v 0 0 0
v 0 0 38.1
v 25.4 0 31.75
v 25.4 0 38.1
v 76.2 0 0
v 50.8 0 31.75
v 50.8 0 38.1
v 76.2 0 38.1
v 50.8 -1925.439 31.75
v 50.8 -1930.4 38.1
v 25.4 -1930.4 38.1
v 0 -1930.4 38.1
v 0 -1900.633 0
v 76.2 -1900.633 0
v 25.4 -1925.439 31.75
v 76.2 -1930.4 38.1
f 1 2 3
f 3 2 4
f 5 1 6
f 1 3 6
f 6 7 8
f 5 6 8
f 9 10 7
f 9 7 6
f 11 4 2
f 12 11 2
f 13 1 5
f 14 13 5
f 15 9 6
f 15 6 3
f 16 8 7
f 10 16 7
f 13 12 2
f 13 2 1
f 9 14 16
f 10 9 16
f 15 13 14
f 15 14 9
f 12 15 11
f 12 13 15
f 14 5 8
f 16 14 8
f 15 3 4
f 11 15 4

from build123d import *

# Parameters (mm, degrees)
F1_DEPTH    = 1930.4
F2_T1_DEPTH = 272.7606343602


# Not quite as in the source:
# - a fillet or chamfer that OpenCascade refuses, or shapes differently, is made with other operations: its cross-section is extruded or revolved along the edge and cut away or added


with BuildPart() as f1:
    # F0 (on Front) → F1 (new body)
    with BuildSketch(Plane.XZ):
        Polygon((0, 38.1), (0, 0), (76.2, 0), (76.2, 38.1), (50.8, 38.1), (50.8, 31.75), (25.4, 31.75), (25.4, 38.1), align=None)
    extrude(amount=F1_DEPTH)

    # F2: chamfer of 38.1 x 29.7669823699 on 1 edges, made by hand

    # F2_s2 → F2_t1 (cut)
    with BuildSketch(Plane.YZ.offset(-98.2803171801)):
        Polygon((-1900.6330176301, 0), (-1930.4, 38.1), (-1930.4, 0), align=None)
    extrude(amount=F2_T1_DEPTH, mode=Mode.SUBTRACT)


solid = f1.part
